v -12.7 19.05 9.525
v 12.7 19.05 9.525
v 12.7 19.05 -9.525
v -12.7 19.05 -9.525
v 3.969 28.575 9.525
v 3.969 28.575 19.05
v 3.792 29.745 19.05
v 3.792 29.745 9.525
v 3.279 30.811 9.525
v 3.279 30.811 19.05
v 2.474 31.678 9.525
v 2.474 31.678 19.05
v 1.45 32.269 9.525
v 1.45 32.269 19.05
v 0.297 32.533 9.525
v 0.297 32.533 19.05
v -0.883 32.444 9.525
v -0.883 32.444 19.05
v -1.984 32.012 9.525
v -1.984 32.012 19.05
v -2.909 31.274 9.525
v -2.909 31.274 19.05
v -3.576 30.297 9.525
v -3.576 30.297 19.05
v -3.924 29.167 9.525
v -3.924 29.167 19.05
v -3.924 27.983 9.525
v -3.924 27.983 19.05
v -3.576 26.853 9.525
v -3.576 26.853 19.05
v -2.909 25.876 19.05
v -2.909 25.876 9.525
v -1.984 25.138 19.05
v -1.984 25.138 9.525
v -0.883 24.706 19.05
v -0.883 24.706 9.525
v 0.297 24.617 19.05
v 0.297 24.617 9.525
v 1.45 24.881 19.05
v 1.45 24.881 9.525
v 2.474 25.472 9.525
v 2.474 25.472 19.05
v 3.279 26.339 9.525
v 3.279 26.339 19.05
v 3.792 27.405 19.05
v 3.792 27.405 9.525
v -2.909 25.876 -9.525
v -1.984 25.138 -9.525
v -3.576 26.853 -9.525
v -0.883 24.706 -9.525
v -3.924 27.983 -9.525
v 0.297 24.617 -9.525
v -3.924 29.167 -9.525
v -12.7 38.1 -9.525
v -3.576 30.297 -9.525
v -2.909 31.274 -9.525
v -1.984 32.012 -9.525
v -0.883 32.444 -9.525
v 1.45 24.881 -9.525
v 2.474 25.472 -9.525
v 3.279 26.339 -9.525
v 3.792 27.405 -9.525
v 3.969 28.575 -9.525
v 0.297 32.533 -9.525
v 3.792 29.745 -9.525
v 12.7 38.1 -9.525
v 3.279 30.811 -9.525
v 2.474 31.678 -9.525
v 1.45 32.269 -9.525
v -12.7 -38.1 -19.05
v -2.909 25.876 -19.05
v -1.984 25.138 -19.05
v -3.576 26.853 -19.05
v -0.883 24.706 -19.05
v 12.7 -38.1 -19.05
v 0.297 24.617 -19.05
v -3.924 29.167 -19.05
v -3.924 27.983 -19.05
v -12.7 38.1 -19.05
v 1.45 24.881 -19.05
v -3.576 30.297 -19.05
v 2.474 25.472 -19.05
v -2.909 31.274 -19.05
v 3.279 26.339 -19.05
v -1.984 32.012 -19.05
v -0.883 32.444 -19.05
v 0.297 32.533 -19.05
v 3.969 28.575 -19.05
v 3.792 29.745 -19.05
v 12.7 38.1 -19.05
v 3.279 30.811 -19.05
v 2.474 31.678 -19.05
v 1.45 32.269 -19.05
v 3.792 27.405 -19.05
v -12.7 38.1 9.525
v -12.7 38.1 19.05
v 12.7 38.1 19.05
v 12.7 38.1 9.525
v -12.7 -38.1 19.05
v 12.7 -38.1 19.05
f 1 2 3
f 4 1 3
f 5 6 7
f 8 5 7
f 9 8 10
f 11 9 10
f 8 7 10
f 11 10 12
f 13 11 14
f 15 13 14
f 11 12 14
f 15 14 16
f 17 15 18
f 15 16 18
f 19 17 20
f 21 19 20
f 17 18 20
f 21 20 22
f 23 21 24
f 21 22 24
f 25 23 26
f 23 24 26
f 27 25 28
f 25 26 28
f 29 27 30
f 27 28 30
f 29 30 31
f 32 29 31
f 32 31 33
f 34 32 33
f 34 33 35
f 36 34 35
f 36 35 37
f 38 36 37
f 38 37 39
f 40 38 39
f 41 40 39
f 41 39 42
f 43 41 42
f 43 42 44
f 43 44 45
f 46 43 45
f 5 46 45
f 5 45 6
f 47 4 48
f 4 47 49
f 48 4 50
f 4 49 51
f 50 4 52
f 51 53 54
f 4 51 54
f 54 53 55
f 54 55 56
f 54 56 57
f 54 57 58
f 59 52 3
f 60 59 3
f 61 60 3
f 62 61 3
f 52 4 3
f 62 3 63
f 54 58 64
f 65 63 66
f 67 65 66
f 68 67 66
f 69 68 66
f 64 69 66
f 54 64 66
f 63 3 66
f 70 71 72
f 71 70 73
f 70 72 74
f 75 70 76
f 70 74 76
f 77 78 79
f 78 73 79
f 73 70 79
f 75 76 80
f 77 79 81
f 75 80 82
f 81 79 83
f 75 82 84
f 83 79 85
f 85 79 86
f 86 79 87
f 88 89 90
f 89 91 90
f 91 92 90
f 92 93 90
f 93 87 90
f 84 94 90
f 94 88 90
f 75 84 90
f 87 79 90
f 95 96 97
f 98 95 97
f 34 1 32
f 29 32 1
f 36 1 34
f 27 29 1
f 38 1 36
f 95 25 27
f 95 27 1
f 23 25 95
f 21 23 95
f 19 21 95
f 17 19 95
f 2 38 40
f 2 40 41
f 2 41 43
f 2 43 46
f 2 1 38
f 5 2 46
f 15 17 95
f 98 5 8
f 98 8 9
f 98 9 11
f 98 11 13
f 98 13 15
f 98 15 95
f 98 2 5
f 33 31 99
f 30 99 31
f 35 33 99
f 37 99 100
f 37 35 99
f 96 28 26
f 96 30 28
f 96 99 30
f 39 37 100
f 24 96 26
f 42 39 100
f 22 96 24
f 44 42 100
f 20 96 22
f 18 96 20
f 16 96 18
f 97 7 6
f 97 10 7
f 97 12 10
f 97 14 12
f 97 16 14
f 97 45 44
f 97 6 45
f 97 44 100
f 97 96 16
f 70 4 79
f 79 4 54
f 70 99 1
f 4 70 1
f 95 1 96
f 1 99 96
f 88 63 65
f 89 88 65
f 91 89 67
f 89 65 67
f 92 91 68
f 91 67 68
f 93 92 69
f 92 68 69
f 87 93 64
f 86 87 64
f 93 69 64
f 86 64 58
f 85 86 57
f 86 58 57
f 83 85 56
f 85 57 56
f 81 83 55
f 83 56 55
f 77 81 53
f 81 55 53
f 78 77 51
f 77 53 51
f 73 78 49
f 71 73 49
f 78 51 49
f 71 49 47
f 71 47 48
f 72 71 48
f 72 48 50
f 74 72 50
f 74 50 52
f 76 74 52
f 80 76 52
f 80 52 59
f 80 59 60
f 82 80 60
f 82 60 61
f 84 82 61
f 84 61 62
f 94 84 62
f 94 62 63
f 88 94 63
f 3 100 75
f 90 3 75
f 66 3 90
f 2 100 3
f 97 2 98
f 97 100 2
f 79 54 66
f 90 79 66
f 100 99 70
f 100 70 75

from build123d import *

# Parameters (mm, degrees)
SKETCH1_W           = 25.4
SKETCH1_H           = 76.2
BOSS_EXTRUDE1_DEPTH = 19.05
SKETCH2_W           = 19.05
SKETCH2_H           = 19.05
CUT_EXTRUDE1_DEPTH  = 50.595085442
CUT_EXTRUDE2_REACH  = 57.358
SKETCH4_R           = 3.96875


with BuildPart() as part:
    # Sketch1 → Boss-Extrude1 (new, symmetric)
    with BuildSketch(Plane.XY):
        Rectangle(SKETCH1_W, SKETCH1_H)
    extrude(amount=BOSS_EXTRUDE1_DEPTH, both=True)

    # Sketch2 → Cut-Extrude1 (cut, through all)
    with BuildSketch(Plane(origin=(12.7, 0, 0), x_dir=(0, 0, -1), z_dir=(1, 0, 0))):
        with Locations((0, 28.575)):
            Rectangle(SKETCH2_W, SKETCH2_H)
    extrude(amount=-CUT_EXTRUDE1_DEPTH, mode=Mode.SUBTRACT)

    # Cut-Extrude2: up to this face of the body (flat: up to its plane)
    cut_extrude2_end = Plane(part.part.faces().sort_by_distance((0, 0, -19.05))[0])
    # Sketch4 → Cut-Extrude2 (cut, up to the picked face)
    with BuildSketch(Plane.XY.offset(19.05), mode=Mode.PRIVATE) as cut_extrude2_sk1:
        with Locations((0, 28.575)):
            Circle(SKETCH4_R)
    cut_extrude2_tool1 = split(extrude(cut_extrude2_sk1.sketch, amount=-CUT_EXTRUDE2_REACH, mode=Mode.PRIVATE), bisect_by=cut_extrude2_end, keep=Keep.BOTH, mode=Mode.PRIVATE)
    add(cut_extrude2_tool1.solids().sort_by(Axis((0, 28.575, 19.05), (0, 0, -1)))[0], mode=Mode.SUBTRACT)


solid = part.part
